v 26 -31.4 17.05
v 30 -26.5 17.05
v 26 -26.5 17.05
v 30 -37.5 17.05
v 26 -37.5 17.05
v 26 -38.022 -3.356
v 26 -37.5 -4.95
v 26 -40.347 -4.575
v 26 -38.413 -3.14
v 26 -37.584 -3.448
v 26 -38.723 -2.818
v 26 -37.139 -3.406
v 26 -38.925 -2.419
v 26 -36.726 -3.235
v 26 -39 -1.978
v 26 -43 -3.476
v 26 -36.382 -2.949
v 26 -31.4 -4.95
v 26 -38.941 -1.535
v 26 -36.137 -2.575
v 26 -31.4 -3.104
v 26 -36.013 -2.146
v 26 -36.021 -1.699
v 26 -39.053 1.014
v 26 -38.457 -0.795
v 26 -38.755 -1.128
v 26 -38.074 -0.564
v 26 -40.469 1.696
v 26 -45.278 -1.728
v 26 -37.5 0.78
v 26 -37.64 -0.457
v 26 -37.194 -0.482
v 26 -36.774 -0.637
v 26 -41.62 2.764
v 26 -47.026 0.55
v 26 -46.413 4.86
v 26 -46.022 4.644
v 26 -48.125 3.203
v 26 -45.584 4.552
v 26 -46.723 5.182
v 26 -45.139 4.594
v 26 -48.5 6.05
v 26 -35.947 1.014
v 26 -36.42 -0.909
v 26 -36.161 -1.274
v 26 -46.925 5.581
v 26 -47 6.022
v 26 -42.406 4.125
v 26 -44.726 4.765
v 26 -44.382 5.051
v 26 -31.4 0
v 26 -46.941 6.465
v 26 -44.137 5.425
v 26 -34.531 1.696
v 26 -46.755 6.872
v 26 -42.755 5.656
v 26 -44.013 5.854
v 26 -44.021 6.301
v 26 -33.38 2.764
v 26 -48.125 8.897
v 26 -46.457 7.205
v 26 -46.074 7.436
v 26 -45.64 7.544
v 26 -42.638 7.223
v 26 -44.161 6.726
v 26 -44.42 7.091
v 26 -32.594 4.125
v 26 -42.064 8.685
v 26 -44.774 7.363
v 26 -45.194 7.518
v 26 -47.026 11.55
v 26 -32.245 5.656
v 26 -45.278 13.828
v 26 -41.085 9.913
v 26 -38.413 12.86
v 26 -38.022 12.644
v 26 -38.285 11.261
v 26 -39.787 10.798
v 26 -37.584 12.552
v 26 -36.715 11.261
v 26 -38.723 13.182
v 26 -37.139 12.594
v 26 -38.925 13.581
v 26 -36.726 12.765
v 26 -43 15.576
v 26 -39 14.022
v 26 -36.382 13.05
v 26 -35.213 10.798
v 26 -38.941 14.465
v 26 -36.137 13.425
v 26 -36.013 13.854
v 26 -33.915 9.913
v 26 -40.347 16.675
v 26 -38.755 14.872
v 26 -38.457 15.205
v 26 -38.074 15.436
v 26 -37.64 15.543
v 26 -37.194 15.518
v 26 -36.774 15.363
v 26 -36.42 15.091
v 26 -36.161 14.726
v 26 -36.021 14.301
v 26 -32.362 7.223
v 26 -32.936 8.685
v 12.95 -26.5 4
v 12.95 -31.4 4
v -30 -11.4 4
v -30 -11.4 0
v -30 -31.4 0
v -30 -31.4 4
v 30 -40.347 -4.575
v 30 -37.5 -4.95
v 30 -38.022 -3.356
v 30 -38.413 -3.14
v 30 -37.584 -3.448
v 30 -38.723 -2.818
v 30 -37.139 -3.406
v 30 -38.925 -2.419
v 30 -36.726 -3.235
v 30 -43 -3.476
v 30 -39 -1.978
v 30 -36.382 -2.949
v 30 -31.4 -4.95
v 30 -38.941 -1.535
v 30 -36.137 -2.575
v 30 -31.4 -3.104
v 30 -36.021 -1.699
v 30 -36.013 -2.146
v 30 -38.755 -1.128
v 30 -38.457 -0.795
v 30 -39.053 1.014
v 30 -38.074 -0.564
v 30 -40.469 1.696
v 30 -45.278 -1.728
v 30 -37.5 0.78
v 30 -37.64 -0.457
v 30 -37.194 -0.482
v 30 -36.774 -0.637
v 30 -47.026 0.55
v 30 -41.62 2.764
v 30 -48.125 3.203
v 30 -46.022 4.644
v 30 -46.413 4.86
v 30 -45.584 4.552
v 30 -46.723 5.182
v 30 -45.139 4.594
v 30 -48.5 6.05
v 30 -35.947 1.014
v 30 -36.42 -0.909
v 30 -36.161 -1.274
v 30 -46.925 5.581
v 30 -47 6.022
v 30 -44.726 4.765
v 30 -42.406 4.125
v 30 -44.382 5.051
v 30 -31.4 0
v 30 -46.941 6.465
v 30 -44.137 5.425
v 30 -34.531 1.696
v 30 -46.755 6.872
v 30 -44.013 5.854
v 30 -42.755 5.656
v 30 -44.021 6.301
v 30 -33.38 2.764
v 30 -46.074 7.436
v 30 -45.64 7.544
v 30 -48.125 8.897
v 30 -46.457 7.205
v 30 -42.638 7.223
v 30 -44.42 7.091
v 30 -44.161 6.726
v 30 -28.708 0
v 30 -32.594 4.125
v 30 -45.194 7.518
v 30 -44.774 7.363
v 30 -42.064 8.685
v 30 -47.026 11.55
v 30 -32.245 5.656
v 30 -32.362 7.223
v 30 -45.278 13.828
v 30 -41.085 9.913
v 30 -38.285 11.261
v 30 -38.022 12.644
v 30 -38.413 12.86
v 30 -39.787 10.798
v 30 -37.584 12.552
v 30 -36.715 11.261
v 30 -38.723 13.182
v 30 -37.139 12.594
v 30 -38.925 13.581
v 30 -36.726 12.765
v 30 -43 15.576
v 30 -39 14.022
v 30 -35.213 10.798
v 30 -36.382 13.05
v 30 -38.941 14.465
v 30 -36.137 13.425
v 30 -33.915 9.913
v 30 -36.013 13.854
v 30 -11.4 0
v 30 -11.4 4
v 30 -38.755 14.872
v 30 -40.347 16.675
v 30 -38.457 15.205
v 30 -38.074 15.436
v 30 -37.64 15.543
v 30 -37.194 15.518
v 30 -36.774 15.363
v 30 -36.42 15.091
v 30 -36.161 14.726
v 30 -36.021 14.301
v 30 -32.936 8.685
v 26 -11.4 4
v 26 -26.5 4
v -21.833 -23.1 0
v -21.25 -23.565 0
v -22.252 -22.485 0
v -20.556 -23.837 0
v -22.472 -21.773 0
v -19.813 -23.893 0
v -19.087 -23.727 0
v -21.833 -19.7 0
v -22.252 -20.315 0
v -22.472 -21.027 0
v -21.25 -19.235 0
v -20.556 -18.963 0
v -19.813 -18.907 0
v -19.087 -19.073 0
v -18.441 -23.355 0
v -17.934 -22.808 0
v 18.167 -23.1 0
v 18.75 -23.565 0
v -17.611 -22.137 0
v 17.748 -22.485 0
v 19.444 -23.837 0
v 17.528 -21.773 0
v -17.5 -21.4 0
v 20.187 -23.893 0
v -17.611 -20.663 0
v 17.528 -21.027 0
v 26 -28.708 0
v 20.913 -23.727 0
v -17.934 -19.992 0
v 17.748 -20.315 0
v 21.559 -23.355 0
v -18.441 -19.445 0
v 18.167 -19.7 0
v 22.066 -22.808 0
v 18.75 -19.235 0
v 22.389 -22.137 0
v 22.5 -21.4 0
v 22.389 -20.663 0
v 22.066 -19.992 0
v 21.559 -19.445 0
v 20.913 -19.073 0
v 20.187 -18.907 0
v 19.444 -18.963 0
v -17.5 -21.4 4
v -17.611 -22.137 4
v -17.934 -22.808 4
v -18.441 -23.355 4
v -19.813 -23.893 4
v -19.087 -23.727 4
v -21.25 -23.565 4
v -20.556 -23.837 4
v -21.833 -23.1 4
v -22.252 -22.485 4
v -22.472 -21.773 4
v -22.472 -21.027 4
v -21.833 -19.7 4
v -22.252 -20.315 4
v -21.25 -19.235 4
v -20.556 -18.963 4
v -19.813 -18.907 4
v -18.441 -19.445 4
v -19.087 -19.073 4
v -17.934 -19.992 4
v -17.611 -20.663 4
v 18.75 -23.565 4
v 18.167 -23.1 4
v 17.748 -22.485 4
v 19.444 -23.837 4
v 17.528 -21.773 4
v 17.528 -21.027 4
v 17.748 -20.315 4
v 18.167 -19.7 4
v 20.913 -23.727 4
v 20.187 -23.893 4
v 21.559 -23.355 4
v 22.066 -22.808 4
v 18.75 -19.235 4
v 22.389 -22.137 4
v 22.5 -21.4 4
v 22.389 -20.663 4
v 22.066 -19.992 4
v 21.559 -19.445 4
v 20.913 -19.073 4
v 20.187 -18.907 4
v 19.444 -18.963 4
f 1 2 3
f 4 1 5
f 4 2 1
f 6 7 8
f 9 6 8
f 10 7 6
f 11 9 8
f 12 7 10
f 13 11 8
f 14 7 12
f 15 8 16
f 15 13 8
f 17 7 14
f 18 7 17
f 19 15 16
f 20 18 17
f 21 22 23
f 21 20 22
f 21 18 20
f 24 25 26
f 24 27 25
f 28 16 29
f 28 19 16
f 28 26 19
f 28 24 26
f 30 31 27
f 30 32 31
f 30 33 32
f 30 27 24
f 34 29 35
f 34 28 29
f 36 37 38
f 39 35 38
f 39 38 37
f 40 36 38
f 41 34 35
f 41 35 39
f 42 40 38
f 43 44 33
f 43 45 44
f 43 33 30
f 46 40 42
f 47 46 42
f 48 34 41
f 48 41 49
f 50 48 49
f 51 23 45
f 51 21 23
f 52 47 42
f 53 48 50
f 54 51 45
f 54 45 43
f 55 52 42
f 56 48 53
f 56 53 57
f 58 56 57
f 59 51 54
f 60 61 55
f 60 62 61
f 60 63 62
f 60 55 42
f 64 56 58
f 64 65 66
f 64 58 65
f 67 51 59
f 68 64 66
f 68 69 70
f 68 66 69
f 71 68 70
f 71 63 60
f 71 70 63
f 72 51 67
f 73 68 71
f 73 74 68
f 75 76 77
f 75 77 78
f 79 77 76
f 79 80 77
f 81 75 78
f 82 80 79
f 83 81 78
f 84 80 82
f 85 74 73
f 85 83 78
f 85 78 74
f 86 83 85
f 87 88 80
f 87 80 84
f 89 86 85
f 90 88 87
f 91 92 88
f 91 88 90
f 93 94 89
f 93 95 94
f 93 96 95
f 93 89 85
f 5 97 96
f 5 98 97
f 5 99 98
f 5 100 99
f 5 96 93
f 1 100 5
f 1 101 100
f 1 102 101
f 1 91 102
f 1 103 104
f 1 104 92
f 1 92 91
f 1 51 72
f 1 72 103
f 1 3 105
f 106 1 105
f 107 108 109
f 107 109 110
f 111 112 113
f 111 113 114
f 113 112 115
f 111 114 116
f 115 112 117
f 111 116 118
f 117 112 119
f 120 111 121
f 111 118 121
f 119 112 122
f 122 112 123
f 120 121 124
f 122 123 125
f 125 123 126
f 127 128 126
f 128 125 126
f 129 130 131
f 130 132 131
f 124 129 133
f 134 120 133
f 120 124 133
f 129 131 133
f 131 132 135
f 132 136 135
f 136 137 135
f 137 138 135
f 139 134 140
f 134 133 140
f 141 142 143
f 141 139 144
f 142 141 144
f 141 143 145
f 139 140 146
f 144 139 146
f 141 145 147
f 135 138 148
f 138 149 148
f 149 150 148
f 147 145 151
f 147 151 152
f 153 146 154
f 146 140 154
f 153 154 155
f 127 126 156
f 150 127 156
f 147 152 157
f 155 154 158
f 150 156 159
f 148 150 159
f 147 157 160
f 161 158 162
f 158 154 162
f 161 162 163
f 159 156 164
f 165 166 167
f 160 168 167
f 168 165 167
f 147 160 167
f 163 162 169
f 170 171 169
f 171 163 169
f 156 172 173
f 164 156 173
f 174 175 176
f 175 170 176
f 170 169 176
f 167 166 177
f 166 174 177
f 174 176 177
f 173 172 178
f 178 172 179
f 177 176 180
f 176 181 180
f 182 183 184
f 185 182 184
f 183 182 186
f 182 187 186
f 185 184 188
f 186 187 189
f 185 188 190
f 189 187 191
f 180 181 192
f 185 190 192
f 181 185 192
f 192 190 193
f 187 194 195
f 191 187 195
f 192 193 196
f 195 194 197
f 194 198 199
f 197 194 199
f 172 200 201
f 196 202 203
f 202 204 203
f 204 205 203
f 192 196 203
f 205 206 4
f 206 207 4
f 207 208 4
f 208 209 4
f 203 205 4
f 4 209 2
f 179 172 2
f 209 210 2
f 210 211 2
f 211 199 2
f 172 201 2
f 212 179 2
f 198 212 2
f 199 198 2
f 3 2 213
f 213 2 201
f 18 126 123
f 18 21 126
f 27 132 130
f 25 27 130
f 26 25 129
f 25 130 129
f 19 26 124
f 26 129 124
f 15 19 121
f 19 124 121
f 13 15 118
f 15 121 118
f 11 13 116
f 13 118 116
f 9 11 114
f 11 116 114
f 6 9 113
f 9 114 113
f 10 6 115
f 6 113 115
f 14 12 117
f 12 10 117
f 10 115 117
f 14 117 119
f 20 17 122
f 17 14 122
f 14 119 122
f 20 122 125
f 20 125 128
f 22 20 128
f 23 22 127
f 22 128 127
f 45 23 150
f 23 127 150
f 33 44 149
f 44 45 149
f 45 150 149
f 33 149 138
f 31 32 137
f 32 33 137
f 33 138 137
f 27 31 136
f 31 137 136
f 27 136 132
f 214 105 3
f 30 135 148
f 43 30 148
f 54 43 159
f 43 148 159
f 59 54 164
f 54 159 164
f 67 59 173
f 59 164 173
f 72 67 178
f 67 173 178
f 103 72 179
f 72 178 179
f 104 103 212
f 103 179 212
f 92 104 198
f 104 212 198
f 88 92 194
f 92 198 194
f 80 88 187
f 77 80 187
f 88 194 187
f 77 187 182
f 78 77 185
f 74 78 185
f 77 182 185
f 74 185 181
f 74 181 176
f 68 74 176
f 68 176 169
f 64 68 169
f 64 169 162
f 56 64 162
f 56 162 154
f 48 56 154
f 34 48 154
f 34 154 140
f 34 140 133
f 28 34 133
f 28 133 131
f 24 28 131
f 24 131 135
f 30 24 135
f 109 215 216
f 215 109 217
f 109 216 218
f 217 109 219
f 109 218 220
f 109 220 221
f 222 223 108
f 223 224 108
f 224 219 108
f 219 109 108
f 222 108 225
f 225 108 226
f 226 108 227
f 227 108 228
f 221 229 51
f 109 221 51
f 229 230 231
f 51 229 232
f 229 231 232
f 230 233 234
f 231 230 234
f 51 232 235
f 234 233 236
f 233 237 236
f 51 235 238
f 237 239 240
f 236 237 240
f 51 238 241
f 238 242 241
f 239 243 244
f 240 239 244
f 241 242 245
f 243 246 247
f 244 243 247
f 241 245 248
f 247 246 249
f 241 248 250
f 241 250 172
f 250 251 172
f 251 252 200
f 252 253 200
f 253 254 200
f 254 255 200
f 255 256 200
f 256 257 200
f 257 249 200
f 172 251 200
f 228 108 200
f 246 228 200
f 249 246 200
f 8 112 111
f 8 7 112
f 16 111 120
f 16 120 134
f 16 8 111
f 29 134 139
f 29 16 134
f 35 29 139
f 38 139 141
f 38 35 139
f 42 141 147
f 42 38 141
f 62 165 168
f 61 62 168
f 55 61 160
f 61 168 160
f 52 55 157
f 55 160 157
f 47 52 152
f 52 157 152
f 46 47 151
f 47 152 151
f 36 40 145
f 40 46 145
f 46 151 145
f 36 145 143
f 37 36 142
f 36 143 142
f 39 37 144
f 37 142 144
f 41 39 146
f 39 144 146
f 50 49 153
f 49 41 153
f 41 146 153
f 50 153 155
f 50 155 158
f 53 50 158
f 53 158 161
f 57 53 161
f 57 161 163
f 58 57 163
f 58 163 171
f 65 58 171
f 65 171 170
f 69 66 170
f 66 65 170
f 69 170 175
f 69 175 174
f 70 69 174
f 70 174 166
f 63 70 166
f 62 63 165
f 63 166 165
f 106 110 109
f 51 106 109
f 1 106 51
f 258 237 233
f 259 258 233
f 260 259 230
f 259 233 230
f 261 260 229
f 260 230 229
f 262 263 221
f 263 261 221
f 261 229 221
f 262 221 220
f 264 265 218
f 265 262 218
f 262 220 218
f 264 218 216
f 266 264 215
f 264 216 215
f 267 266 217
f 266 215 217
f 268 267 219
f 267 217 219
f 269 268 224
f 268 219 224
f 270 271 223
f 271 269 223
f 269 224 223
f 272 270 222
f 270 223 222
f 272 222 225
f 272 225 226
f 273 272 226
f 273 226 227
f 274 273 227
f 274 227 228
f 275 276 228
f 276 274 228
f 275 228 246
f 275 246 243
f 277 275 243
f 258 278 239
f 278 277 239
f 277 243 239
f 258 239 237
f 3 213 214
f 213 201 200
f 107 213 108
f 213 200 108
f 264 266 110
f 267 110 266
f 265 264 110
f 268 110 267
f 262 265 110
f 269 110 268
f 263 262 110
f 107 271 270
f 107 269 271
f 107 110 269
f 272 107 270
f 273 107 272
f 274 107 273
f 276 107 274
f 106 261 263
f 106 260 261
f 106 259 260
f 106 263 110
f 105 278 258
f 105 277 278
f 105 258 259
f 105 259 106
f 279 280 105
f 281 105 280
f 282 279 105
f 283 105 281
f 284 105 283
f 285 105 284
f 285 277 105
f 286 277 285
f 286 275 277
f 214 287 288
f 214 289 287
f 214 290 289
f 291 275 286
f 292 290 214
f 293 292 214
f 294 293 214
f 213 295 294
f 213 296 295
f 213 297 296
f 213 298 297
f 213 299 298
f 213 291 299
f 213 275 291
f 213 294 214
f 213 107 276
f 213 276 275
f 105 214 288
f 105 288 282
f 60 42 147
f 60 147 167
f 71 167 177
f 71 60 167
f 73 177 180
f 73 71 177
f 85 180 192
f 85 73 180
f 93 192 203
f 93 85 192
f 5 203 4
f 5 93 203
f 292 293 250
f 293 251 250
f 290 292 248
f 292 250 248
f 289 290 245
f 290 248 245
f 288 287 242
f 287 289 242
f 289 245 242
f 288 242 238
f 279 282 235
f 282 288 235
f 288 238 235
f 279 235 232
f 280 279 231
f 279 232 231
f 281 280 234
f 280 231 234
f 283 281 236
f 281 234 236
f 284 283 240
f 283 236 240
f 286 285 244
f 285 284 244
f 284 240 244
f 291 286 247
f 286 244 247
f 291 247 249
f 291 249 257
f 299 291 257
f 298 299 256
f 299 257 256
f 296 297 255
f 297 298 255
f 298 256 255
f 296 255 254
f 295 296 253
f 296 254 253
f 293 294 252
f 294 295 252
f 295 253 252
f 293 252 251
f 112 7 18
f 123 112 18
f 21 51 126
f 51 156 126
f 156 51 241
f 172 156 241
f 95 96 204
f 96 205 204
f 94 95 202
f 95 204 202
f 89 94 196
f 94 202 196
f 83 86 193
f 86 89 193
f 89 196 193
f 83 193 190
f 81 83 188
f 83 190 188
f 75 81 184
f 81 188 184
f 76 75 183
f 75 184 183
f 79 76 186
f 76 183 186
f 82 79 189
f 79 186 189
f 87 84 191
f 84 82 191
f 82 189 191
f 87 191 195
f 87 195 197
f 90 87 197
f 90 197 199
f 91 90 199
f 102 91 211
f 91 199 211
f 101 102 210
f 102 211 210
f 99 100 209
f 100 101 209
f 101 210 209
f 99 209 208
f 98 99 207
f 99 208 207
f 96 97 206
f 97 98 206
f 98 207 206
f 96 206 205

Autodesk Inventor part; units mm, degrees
ref_plane "YZ Plane" through (0, 0, 0) normal (1, 0, 0) x (0, 1, 0)
sketch "Sketch1" plane through (0, 0, 0) normal (0, 0, 1) x (1, 0, 0)
  circle A0 centre (20, -21.4) radius 2.5 projected
  circle A1 centre (20, 21.4) radius 2.5 projected
  circle A2 centre (-20, -21.4) radius 2.5 projected
  circle A3 centre (-20, 21.4) radius 2.5 projected
  line L0 (-30, 31.4) -> (-30, -31.4) projected
  line L1 (-30, -31.4) -> (30, -31.4) projected
  line L2 (30, -31.4) -> (30, 31.4) projected
  line L3 (30, 31.4) -> (-30, 31.4) projected
  line L4 (-30, -44.5) -> (60, -44.5)
  line L5 (60, -44.5) -> (60, -30.5) projected
  line L6 (-30, -30.5) -> (60, -30.5)
  line L7 (-30, -31.4) -> (30, -31.4)
  line L8 (30, -31.4) -> (30, -11.4)
  line L9 (30, -11.4) -> (-30, -11.4)
  line L10 (-30, -11.4) -> (-30, -31.4)
  line L11 (30, -11.4) -> (-30, -11.4)
  line L12 (-30, -11.4) -> (-30, -28.7084)
  line L13 (-30, -28.7084) -> (30, -28.7084)
  line L14 (30, -28.7084) -> (30, -11.4)
  point P0 (0, 0)
  dimension "d0" = 20
  dimension "d1" = 0
extrude "Extrusion1" add sketch "Sketch1" along normal blind 4 contours L9 L2 L13 L0
ref_plane "Work Plane1" through (30, -47.6627, 1.8405) normal (-1, 0, 0) x (0, -0.3826834, 0.9238795)
sketch "Sketch2" plane through (30, -47.6627, 1.8405) normal (-1, 0, 0) x (0, -0.3826834, 0.9238795)
  circle A0 centre (0, 11) radius 4 projected
  arc A1 (-10.7913, 13.1327) -> (-9.1051, 17.1723) centre (0, 11) ccw
  line L0 (-5.2583, 18.3379) -> (-11.882, 34.3288) projected
  line L1 (-5.9532, -3.3722) -> (-10.1627, 6.7905)
  line L2 (5.9532, 25.3722) -> (14.3722, 5.0468)
  line L3 (14.3722, 5.0468) -> (-5.9532, -3.3722)
  line L4 (-5.9532, -3.3722) -> (5.9532, 25.3722) construction
  line L5 (-14.3722, 16.9532) -> (14.3722, 5.0468) construction
  line L6 (-7.9238, 14.3204) -> (-13.7905, 11.8904) projected
  line L7 (-7.9238, 14.3204) -> (-31.9564, 72.3401) projected
  line L8 (-4.2095, 21.1627) -> (5.9532, 25.3722)
  line L9 (-28.0775, 29.1357) -> (1.083, -41.2639) projected
  circle A2 centre (7.391, 14.0615) radius 1.5 projected
  circle A3 centre (-7.391, 7.9385) radius 1.5 projected
  circle A4 centre (-3.0615, 18.391) radius 1.5 projected
  circle A5 centre (3.0615, 3.609) radius 1.5 projected
  circle A6 centre (0, 11) radius 4 projected
  circle A7 centre (0, 11) radius 11 projected
  point P0 (-19.9401, 43.3302)
extrude "Extrusion2" add sketch "Sketch2" along normal blind 4 contours L6 L7 A1 | A1 L3 L1 | A1 L2 L3 | L8 L2 A1
sketch "Sketch3" plane through (30, -11.4, 4) normal (1, 0, 0) x (0, 0, -1)
  line L0 (-13.05, -15.1) -> (-2.05, -15.1) projected
  line L1 (-13.05, -15.1) -> (0, 0)
  arc A0 (0, -15.2927) -> (-2.05, -15.1) centre (-2.05, -26.1) ccw projected
  line L2 (0, 0) -> (0, -15.2927)
  line L3 (0, -15.2927) -> (-13.05, -15.1)
  point P0 (4, 11.4)
extrude "Extrusion3" add sketch "Sketch3" against normal up to surface (4 mm away) contours L1 L2 A0 L0
sketch "Sketch6" plane through (26, -47.6627, 1.8405) normal (-1, 0, 0) x (0, -0.3826834, 0.9238795)
  circle A0 centre (-3.0615, 18.391) radius 1.5 projected
  circle A1 centre (-3.0615, 18.391) radius 2.75
  point P0 (-19.9401, 43.3302)
  dimension "d10" = 5.5
extrude "Extrusion5" add sketch "Sketch6" against normal up to surface (4 mm away) contours A0
sketch "Sketch7" plane through (-30, -28.7084, 0) normal (0, -1, 0) x (1, 0, 0)
  line L0 (56, 17.05) -> (42.95, 4)
  line L1 (0, 4) -> (56, 4) projected
  line L2 (42.95, 4) -> (56, 4)
  line L3 (56, -4.95) -> (56, 17.05) projected
  line L4 (56, 4) -> (56, 17.05)
  point P0 (30, 0)
  dimension "d13" = 45
extrude "Extrusion6" add sketch "Sketch7" against normal up to surface (2.2084 mm away)
sketch "Sketch8" plane through (-30, -28.7084, 0) normal (0, -1, 0) x (1, 0, 0)
  line L0 (56, 0) -> (56, 17.05) projected
  line L1 (56, 17.05) -> (42.95, 4) projected
  line L2 (0, 4) -> (42.95, 4) projected
  line L3 (0, 0) -> (0, 4) projected
  line L4 (0, 0) -> (56, 0) projected
  line L5 (0, 0) -> (56, 0) projected
  line L6 (0, 0) -> (56, 0)
  line L7 (56, 0) -> (56, 4)
  line L8 (56, 4) -> (0, 4)
  line L9 (0, 4) -> (0, 0)
  point P0 (30, 0)
ref_plane "Work Plane2" through (-30, -31.4, -6.35) normal (0, -1, 0) x (1, 0, 0)
extrude "Extrusion7" add sketch "Sketch8" along normal up to surface (2.6916 mm away) contours L4 L3 L2 L8 L0
sketch "Sketch10" plane through (12.95, -28.7084, 4) normal (0, -1, 0) x (1, 0, 0)
  line L0 (0, 0) -> (13.05, 0) projected
  line L1 (13.05, 0) -> (13.05, 13.05) projected
  line L2 (13.05, 13.05) -> (0, 0) projected
  point P0 (-12.95, -4)
extrude "Extrusion8" add sketch "Sketch10" along normal up to surface (2.6916 mm away)
sketch "Sketch12" plane through (26, -47.6627, 1.8405) normal (-1, 0, 0) x (0, -0.3826834, 0.9238795)
  circle A0 centre (7.391, 14.0615) radius 1.5 projected
  circle A1 centre (-7.391, 7.9385) radius 1.5 projected
  circle A2 centre (3.0615, 3.609) radius 1.5 projected
  circle A3 centre (0, 11) radius 4 projected
  line L0 (7.8283, 20.8452) -> (-7.9238, 14.3204) projected
  line L1 (-7.9238, 14.3204) -> (-10.7913, 13.1327) projected
  arc A4 (-10.7913, 13.1327) -> (-10.1627, 6.7905) centre (0, 11) ccw projected
  line L2 (-10.1627, 6.7905) -> (-5.9532, -3.3722) projected
  line L3 (-5.9532, -3.3722) -> (14.3722, 5.0468) projected
  line L4 (14.3722, 5.0468) -> (7.8283, 20.8452) projected
  line L5 (-10.1627, 6.7905) -> (-12.497, 12.4261)
  line L6 (-10.1627, 6.7905) -> (-5.9532, -3.3722) projected
  line L7 (-10.7913, 13.1327) -> (-12.497, 12.4261)
  line L8 (-7.9238, 14.3204) -> (-10.7913, 13.1327) projected
  point P0 (-19.9401, 43.3302)
extrude "Extrusion9" add sketch "Sketch12" against normal up to surface (4 mm away) contours A4 L5 L7
fillet "Fillet1" radius 11 2 edges at (28, -48.5, 17.05) (28, -48.5, -4.95)
sketch "Sketch15" plane through (30, -31.4, 0) normal (1, 0, 0) x (0, 0, -1)
  circle A0 centre (-6.05, -6.1) radius 4 projected
  circle A1 centre (-6.05, -6.1) radius 5.27
  point P0 (0, 31.4)
  dimension "d24" = 1.27
extrude "Extrusion10" cut sketch "Sketch15" against normal through all
properties part number "nutHolderX"
